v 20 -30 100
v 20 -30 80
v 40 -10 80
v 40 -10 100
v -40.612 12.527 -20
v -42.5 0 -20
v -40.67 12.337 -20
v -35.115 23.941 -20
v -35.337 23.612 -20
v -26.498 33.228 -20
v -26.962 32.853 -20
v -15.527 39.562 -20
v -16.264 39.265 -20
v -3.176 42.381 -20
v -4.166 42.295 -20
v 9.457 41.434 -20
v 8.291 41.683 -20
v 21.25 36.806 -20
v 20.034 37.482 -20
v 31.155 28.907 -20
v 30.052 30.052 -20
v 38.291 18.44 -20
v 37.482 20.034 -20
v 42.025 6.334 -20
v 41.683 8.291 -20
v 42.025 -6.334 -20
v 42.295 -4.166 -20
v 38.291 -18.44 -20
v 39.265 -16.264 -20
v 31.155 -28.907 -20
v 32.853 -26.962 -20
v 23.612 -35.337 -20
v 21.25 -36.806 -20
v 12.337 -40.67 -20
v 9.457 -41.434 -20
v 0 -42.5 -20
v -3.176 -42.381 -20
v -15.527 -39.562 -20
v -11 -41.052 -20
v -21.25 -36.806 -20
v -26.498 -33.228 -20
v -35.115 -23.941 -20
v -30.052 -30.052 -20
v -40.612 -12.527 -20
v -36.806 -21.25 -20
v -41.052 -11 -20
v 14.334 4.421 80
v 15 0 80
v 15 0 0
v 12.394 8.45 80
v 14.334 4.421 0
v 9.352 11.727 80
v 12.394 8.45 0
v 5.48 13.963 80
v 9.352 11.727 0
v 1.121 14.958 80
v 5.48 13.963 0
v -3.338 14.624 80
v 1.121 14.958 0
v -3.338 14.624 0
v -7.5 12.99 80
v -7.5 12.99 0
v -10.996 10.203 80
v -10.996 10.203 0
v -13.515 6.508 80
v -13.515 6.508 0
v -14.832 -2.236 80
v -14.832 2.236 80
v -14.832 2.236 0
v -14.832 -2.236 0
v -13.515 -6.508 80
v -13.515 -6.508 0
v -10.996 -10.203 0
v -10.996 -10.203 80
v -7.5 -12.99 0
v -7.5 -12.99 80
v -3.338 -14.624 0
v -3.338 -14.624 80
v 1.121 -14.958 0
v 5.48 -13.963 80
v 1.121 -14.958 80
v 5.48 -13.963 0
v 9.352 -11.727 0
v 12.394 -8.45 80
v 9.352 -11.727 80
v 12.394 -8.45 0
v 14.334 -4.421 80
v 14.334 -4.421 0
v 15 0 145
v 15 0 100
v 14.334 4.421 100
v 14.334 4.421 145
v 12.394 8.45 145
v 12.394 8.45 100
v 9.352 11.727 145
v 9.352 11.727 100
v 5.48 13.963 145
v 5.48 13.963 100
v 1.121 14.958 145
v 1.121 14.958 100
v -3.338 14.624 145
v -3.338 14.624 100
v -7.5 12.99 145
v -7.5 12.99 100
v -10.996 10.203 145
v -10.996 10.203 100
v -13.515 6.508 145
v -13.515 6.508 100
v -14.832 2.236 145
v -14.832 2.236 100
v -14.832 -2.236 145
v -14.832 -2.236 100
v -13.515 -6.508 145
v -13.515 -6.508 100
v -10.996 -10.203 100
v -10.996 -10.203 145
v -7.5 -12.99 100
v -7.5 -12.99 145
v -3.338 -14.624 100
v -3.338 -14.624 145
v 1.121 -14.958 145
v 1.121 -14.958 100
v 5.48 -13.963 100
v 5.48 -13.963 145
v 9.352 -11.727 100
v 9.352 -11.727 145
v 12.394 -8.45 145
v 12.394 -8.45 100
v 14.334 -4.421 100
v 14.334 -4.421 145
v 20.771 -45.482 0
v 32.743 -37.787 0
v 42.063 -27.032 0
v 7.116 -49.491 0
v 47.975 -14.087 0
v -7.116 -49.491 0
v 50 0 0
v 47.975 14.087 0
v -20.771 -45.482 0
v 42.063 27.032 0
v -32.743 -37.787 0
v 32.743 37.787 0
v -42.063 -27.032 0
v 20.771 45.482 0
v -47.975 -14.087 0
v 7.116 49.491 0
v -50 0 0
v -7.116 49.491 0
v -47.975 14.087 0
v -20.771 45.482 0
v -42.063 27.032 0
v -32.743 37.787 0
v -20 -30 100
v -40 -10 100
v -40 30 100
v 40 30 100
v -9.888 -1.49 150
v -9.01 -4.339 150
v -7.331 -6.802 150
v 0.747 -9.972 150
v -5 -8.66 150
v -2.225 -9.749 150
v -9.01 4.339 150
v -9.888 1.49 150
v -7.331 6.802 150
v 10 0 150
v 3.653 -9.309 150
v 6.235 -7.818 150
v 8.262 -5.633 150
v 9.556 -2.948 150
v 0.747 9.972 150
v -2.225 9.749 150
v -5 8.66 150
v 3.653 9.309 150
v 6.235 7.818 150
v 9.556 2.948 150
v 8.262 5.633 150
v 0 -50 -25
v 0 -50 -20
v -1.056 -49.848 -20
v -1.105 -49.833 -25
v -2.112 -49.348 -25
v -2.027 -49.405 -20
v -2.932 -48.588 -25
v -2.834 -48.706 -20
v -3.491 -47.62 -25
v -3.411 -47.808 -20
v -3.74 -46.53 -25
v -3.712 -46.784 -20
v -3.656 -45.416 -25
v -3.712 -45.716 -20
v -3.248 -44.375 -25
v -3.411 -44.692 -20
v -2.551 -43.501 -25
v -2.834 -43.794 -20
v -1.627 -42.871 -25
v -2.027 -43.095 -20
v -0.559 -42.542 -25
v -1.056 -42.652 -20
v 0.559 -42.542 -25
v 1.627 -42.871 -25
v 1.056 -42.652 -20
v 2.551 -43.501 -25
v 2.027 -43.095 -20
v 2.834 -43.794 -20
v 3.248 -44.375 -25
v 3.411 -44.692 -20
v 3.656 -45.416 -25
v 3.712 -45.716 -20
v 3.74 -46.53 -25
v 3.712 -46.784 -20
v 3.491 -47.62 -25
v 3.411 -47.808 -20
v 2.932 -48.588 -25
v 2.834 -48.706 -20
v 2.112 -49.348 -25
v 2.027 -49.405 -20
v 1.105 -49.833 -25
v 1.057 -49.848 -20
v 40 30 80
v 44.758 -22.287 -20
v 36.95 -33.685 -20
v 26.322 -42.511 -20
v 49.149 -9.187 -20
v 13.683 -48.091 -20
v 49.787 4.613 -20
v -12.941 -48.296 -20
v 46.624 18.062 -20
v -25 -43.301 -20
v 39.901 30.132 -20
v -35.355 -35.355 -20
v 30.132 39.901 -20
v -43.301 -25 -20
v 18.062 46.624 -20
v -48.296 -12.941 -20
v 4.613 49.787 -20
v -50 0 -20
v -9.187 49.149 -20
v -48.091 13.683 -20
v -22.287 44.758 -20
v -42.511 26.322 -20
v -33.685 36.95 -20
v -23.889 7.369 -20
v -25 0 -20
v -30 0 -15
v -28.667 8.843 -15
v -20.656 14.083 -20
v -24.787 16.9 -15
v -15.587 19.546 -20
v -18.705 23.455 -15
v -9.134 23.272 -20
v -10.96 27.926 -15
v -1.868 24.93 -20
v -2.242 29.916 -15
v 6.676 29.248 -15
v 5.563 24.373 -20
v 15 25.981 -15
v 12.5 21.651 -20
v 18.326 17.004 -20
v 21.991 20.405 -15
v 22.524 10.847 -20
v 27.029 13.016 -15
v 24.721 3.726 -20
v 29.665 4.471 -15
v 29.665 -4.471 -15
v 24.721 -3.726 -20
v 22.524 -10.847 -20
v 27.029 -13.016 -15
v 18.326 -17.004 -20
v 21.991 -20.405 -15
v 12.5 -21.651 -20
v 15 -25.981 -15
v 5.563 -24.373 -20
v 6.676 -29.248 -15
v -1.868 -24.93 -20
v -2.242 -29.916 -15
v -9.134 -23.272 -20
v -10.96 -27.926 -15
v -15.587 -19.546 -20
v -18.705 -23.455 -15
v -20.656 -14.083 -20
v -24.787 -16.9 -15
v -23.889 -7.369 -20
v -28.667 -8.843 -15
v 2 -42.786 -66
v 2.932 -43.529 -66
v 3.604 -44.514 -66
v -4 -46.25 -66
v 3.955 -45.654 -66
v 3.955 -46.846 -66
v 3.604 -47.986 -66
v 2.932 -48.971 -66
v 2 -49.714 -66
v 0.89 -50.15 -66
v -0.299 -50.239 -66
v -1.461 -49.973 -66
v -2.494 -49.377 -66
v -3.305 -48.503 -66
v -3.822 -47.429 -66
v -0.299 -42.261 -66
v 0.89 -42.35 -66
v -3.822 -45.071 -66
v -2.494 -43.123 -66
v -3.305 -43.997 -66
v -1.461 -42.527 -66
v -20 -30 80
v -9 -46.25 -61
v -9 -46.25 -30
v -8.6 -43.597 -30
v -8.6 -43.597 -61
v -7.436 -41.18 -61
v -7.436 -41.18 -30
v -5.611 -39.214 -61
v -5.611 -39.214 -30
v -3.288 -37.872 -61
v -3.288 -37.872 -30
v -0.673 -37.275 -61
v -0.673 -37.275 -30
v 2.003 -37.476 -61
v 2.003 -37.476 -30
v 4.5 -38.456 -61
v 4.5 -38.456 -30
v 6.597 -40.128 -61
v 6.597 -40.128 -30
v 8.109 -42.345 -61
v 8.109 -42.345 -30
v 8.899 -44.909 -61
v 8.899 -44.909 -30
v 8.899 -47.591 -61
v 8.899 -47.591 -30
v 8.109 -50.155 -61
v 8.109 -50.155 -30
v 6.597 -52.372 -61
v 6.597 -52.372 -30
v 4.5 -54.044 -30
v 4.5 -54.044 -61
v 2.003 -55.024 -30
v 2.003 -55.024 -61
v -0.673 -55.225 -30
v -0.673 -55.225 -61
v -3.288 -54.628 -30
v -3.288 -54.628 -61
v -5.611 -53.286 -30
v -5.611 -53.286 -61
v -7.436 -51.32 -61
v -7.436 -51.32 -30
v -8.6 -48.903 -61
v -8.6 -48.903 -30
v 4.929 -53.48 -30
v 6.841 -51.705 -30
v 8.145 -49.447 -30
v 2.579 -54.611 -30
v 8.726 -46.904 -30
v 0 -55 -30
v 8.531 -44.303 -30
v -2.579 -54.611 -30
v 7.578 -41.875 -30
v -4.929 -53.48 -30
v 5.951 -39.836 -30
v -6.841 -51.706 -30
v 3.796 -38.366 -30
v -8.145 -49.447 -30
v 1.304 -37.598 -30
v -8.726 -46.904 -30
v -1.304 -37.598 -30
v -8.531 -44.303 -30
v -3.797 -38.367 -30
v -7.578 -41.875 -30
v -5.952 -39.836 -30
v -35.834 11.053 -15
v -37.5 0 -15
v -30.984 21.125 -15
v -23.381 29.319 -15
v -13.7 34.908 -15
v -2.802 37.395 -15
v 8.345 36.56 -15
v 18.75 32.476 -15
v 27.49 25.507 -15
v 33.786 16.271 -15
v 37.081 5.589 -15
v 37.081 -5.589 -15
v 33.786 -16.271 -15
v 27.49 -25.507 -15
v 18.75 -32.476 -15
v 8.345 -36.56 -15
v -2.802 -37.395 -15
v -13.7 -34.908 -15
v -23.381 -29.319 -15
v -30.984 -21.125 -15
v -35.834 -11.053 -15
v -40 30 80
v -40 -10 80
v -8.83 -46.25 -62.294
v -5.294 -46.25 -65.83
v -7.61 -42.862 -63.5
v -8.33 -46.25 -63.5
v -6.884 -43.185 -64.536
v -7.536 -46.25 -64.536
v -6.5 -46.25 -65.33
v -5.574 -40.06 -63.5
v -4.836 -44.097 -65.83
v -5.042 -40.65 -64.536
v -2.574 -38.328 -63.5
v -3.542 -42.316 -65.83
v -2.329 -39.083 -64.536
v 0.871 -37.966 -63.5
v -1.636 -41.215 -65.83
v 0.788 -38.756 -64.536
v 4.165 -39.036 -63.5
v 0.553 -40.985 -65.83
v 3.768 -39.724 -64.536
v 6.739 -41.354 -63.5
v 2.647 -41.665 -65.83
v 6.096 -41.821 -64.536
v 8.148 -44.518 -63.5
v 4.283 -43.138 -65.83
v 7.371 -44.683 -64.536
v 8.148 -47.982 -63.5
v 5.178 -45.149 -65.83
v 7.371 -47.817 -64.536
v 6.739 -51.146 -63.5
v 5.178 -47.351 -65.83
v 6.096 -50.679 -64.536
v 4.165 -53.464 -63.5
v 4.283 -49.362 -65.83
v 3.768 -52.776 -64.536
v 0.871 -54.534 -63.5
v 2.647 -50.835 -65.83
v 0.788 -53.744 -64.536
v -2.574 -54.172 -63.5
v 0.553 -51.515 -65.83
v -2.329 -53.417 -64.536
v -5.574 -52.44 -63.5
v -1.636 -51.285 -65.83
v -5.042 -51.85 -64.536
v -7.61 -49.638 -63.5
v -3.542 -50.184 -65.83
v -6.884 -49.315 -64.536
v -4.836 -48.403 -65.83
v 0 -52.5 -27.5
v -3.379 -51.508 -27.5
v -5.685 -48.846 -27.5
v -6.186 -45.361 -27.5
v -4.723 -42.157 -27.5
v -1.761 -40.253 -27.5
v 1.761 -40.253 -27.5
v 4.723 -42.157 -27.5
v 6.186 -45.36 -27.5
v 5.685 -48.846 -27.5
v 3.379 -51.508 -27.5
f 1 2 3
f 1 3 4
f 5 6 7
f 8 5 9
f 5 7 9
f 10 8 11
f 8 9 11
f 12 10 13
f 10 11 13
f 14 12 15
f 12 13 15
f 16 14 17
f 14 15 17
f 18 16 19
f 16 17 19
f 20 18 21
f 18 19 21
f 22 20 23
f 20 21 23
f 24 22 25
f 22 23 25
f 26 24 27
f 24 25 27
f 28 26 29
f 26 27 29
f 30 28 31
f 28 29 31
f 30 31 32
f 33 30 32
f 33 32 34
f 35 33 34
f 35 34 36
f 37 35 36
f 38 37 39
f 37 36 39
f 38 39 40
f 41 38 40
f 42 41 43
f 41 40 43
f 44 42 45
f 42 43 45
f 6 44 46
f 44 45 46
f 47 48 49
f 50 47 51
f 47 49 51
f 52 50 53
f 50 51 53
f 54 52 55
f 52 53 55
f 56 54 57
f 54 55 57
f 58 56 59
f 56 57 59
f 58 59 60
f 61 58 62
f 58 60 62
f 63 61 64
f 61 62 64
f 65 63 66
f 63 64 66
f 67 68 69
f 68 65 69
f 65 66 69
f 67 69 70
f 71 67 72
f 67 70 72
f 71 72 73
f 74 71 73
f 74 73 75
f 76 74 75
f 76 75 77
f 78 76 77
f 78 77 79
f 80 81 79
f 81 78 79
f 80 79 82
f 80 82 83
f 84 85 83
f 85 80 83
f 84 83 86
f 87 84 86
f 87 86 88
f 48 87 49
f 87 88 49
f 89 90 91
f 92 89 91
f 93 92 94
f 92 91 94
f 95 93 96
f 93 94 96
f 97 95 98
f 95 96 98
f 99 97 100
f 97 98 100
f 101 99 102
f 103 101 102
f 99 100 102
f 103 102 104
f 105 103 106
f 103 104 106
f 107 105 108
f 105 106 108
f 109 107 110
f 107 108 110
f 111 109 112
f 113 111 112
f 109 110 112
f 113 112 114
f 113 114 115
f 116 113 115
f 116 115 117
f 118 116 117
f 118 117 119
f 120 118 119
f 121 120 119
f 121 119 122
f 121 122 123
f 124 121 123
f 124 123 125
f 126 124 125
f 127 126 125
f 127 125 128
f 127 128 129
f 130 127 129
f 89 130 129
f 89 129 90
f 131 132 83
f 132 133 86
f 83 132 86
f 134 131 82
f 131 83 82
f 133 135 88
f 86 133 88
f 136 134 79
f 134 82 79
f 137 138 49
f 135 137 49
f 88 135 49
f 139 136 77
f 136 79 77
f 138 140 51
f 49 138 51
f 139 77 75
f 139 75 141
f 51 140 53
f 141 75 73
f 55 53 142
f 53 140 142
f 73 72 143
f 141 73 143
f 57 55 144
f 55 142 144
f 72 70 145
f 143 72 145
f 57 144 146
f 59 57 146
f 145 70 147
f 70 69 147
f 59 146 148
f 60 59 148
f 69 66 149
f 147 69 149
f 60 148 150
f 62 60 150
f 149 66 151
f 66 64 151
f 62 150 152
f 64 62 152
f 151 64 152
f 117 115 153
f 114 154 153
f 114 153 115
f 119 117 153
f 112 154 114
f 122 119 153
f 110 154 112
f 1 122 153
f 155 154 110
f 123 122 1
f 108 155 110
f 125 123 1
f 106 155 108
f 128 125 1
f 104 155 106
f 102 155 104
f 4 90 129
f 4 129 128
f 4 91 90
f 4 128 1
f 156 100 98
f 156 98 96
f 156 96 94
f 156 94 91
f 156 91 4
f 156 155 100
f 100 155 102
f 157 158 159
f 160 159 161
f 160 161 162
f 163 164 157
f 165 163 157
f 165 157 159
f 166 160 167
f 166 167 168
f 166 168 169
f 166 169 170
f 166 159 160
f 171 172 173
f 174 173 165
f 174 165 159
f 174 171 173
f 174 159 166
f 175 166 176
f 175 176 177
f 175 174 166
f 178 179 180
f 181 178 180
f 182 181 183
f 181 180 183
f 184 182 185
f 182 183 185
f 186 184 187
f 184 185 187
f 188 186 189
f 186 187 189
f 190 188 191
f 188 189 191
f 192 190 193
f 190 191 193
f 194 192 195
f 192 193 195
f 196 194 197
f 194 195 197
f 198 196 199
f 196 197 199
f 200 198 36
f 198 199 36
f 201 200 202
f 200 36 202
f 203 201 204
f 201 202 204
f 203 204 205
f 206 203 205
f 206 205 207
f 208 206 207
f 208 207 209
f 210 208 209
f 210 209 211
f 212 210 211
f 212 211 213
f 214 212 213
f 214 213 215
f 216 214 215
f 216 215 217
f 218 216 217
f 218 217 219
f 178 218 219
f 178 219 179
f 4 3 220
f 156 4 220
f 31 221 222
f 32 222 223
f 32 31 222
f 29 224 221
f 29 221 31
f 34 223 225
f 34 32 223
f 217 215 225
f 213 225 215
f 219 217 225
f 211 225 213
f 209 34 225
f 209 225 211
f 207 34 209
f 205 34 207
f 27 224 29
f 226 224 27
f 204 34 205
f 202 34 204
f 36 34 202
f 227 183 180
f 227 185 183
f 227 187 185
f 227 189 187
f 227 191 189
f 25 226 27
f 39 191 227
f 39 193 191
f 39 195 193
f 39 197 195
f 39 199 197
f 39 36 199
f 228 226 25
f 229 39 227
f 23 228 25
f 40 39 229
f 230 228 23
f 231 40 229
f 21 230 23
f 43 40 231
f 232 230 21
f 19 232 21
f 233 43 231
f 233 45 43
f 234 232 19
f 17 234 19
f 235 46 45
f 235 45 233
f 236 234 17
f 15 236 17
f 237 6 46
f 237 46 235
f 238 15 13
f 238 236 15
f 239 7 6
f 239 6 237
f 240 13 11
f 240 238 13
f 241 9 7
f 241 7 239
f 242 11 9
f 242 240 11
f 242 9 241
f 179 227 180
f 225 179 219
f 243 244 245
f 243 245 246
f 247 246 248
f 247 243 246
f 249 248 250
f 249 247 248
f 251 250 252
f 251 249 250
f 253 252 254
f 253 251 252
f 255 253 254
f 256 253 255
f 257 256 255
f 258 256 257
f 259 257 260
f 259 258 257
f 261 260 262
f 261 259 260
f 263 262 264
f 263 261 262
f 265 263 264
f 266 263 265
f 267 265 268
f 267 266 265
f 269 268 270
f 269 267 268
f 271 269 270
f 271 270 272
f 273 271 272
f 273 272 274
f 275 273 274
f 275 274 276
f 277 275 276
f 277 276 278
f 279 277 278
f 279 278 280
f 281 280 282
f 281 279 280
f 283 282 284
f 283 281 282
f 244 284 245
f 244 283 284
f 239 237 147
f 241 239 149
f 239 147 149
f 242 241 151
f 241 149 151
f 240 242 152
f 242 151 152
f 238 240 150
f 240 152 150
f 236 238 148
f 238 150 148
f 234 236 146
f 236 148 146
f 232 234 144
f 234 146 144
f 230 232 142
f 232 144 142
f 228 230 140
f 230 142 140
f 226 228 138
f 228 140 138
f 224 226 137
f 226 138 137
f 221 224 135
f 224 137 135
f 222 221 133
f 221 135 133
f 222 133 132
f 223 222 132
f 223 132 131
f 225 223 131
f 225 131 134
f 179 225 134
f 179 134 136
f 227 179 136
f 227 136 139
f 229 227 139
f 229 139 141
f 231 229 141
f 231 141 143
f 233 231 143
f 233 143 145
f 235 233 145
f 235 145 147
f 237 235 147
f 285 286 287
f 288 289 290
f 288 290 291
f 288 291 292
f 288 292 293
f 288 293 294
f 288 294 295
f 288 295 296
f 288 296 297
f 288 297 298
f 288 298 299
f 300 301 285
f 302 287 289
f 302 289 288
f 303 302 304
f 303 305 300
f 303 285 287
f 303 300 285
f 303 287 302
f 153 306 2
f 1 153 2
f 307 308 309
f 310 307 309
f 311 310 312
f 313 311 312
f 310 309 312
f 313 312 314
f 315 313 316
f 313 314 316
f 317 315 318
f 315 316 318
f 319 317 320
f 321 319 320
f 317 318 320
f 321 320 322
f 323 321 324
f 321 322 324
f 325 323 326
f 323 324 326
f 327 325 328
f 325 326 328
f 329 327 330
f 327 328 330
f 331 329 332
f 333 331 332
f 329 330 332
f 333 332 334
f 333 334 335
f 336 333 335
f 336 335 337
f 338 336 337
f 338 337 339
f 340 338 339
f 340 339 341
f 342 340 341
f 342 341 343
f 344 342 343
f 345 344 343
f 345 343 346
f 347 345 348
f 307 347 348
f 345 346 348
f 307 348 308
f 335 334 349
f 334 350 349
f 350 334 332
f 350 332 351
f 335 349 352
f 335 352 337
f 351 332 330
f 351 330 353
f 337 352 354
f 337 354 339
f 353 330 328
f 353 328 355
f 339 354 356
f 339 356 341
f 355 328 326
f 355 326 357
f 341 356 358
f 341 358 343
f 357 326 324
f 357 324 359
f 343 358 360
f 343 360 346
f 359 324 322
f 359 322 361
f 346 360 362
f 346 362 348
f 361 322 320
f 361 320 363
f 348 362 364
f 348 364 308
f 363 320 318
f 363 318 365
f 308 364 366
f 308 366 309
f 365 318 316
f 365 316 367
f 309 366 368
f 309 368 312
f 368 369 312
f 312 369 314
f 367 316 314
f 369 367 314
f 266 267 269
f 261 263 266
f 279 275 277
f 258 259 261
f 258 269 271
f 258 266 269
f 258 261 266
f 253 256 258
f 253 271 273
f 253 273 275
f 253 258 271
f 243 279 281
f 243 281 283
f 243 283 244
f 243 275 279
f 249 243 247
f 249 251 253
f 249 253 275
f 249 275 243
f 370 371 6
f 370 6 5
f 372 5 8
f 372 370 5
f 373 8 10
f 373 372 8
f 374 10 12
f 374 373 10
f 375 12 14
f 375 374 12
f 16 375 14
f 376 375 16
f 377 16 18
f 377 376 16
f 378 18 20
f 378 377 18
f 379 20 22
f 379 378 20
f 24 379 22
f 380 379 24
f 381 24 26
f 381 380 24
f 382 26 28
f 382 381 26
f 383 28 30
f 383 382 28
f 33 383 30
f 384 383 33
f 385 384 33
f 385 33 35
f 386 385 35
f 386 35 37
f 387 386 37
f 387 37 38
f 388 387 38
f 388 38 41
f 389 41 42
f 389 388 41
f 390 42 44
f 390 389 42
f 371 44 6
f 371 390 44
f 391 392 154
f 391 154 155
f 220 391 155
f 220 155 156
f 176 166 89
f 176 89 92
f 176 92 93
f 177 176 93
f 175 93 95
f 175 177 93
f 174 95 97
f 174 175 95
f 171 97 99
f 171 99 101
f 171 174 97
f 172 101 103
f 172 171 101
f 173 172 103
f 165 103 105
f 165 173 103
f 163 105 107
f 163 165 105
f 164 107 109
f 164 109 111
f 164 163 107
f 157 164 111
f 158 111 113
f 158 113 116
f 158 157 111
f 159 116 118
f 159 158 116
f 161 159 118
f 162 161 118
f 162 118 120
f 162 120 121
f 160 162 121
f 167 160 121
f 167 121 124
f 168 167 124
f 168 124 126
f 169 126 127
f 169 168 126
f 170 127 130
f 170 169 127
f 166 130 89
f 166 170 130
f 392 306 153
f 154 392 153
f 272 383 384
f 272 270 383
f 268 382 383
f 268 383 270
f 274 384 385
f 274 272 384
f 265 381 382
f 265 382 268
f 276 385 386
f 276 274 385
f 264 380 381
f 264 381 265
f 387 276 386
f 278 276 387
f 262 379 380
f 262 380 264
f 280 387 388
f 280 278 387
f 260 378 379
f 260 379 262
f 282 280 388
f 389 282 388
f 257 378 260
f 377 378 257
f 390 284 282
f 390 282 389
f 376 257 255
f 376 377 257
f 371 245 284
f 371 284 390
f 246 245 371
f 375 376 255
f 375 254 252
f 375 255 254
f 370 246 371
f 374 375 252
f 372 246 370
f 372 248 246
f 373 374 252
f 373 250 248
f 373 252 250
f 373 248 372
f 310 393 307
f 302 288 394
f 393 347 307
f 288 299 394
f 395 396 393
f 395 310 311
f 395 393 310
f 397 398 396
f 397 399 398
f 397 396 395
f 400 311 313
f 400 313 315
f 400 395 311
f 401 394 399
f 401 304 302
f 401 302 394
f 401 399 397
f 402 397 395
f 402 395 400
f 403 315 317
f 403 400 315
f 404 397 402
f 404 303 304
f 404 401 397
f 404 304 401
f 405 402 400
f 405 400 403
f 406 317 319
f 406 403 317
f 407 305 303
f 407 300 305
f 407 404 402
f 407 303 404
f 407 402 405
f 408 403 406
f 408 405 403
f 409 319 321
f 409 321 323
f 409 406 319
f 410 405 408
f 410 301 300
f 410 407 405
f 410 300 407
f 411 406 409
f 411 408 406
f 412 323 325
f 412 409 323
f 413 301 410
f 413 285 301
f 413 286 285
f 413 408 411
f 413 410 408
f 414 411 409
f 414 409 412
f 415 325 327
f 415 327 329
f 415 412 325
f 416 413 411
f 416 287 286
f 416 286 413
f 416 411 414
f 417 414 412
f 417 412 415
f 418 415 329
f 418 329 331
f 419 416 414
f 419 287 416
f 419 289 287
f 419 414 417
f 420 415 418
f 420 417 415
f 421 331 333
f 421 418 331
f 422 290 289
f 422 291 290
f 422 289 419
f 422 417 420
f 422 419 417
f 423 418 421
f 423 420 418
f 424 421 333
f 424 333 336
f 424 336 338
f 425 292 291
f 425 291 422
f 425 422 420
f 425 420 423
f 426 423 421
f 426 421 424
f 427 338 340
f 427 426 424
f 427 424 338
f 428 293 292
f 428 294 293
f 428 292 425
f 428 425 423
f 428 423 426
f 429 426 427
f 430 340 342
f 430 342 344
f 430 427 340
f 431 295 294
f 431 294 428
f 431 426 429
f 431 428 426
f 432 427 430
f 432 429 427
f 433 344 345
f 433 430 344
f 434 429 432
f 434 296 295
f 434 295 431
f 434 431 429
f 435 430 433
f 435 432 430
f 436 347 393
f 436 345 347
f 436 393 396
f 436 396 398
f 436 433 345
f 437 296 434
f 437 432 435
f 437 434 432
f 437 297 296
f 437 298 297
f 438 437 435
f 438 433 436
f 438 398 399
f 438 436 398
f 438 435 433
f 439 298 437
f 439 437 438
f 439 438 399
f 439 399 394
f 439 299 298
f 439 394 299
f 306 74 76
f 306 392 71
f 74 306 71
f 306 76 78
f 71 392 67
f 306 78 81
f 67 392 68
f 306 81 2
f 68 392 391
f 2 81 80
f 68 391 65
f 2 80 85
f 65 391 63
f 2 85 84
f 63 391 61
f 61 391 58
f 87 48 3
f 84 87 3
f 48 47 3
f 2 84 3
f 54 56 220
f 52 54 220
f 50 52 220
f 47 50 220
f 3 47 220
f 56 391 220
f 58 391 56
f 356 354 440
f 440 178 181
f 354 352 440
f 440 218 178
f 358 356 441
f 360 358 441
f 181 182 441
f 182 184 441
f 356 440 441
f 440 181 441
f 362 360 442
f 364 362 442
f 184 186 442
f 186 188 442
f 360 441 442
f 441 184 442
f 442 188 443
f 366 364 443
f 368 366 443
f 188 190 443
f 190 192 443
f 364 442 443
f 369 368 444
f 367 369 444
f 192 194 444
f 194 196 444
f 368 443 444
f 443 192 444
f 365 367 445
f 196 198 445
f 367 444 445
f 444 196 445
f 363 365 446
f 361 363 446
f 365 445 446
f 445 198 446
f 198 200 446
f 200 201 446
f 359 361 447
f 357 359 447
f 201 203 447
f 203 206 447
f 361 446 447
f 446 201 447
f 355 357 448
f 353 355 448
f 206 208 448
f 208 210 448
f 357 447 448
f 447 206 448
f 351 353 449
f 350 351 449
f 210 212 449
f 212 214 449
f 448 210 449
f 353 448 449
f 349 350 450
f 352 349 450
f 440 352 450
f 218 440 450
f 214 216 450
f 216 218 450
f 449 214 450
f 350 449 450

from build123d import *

# Parameters (mm, degrees)
SKETCH_1_R          = 15
EXTRUDE_1_DEPTH     = 150
SKETCH_2_R          = 50
EXTRUDE_2_DEPTH     = 20
SKETCH_3_R          = 42.5
SKETCH_3_R_2        = 25
CUT_EXTRUDE_1_DEPTH = 5
CHAMFER_1_SIZE      = 5
SKETCH_4_R          = 3.75
EXTRUDE_3_DEPTH     = 10
SKETCH_5_R          = 9
EXTRUDE_4_DEPTH     = 36
FILLET_2_R          = 5
CHAMFER_2_SIZE      = 5
CHAMFER_3_SIZE      = 5
SKETCH_6_W          = 80
SKETCH_6_H          = 60
EXTRUDE_5_DEPTH     = 20
CHAMFER_4_SIZE      = 20


with BuildPart() as part:
    # 草图1 → 凸台-拉伸1 (new body)
    with BuildSketch(Plane.XY):
        Circle(SKETCH_1_R)
    extrude(amount=EXTRUDE_1_DEPTH)

    # 草图2 → 凸台-拉伸2 (add)
    with BuildSketch(Plane(origin=(0, 0, 0), x_dir=(-1, 0, 0), z_dir=(0, 0, -1))):
        Circle(SKETCH_2_R)
    extrude(amount=EXTRUDE_2_DEPTH)

    # 草图3 → 切除-拉伸1 (cut)
    with BuildSketch(Plane(origin=(0, 0, -20), x_dir=(-1, 0, 0), z_dir=(0, 0, -1))):
        Circle(SKETCH_3_R)
        Circle(SKETCH_3_R_2, mode=Mode.SUBTRACT)
    extrude(amount=-CUT_EXTRUDE_1_DEPTH, mode=Mode.SUBTRACT)

    # 倒角1
    chamfer_1_edges = [part.edges().sort_by_distance(p)[0] for p in [
        (42.5, 0, -15),
        (25, 0, -15),
    ]]
    chamfer(chamfer_1_edges, length=CHAMFER_1_SIZE - 0.0001)  # a hair under: the kernel refuses the full size

    # 草图4 → 凸台-拉伸3 (add)
    with BuildSketch(Plane(origin=(0, 0, -20), x_dir=(-1, 0, 0), z_dir=(0, 0, -1))):
        with Locations(Location((0, -46.25, 0), (0, 0, 269.999564815))):
            Circle(SKETCH_4_R)
    extrude(amount=EXTRUDE_3_DEPTH)

    # 草图5 → 凸台-拉伸4 (add)
    with BuildSketch(Plane(origin=(0, 0, -30), x_dir=(-1, 0, 0), z_dir=(0, 0, -1))):
        with Locations((0, -46.25)):
            Circle(SKETCH_5_R)
    extrude(amount=EXTRUDE_4_DEPTH)

    # 圆角2
    fillet_2_edges = [part.edges().sort_by_distance(p)[0] for p in [
        (9, -46.25, -66),
    ]]
    fillet(fillet_2_edges, radius=FILLET_2_R)

    # 倒角2
    chamfer_2_edges = [part.edges().sort_by_distance(p)[0] for p in [
        (-2.8483e-05, -42.5, -30),
    ]]
    chamfer(chamfer_2_edges, length=CHAMFER_2_SIZE)

    # 倒角3
    chamfer_3_edges = [part.edges().sort_by_distance(p)[0] for p in [
        (-15, 0, 150),
    ]]
    chamfer(chamfer_3_edges, length=CHAMFER_3_SIZE)

    # 草图6 → 凸台-拉伸5 (add)
    with BuildSketch(Plane.XY.offset(80)):
        Rectangle(SKETCH_6_W, SKETCH_6_H)
    extrude(amount=EXTRUDE_5_DEPTH)

    # 倒角4
    chamfer_4_edges = [part.edges().sort_by_distance(p)[0] for p in [
        (40, -30, 90),
        (-40, -30, 90),
    ]]
    chamfer(chamfer_4_edges, length=CHAMFER_4_SIZE)


solid = part.part
